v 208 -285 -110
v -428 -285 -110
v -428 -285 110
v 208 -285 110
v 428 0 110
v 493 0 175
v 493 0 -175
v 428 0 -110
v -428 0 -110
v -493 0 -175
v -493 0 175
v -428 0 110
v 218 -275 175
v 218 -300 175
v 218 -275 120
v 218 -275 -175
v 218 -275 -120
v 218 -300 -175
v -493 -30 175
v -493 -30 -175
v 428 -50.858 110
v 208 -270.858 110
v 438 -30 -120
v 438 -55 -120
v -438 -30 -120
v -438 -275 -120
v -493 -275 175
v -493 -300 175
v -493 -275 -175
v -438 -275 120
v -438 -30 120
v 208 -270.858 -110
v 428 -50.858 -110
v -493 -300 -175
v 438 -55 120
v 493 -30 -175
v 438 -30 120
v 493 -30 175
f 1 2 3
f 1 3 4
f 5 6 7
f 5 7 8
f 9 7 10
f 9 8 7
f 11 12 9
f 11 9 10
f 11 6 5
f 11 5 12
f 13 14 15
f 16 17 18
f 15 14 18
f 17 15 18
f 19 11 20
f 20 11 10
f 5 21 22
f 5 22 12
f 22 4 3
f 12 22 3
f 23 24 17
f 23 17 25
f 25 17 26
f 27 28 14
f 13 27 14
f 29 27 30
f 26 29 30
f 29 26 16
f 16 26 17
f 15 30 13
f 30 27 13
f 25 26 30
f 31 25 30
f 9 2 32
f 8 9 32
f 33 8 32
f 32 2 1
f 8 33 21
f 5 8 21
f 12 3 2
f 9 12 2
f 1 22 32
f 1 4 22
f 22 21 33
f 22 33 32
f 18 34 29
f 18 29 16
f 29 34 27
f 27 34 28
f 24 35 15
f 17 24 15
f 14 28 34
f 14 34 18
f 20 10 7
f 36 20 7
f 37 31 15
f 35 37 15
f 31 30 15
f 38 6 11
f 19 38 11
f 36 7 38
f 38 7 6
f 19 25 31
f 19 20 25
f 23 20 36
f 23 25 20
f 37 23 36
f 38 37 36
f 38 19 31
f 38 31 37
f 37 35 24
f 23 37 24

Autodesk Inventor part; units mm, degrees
ref_plane "YZ Plane" through (0, 0, 0) normal (1, 0, 0) x (0, 1, 0)
ref_plane "XZ Plane" through (0, 0, 0) normal (0, 1, 0) x (-1, 0, 0)
ref_plane "XY Plane" through (0, 0, 0) normal (0, 0, 1) x (1, 0, 0)
sketch "Эскиз1" plane through (0, 0, 0) normal (0, 1, 0) x (-1, 0, 0)
  line L0 (493, -175) -> (-493, -175)
  line L1 (-493, -175) -> (-493, 175)
  line L2 (-493, 175) -> (493, 175)
  line L3 (493, 175) -> (493, -175)
  line L4 (493, -175) -> (-493, 175) construction
  line L5 (-493, -175) -> (493, 175) construction
  point P0 (0, 0)
  dimension "d0" = 986
  dimension "d1" = 350
extrude "Выдавливание1" add sketch "Эскиз1" against normal blind 300
sketch "Эскиз2" plane through (0, -300, 0) normal (0, -1, 0) x (1, 0, 0)
  line L0 (493, 175) -> (-493, 175) projected
  line L1 (-493, 175) -> (-493, -175) projected
  line L2 (-493, -175) -> (493, -175) projected
  line L3 (493, -175) -> (493, 175) projected
  line L4 (-438, 120) -> (438, 120)
  line L5 (438, 120) -> (438, -120)
  line L6 (438, -120) -> (-438, -120)
  line L7 (-438, -120) -> (-438, 120)
  point P0 (0, 0)
  dimension "d4" = 55
extrude "Выдавливание2" cut sketch "Эскиз2" against normal blind 270
sketch "Эскиз4" plane through (-493, 0, 175) normal (0, 0, 1) x (1, 0, 0)
  line L0 (0, 0) -> (986, 0) projected
  line L1 (986, 0) -> (711, -275)
  line L2 (986, 0) -> (1374.9087, 0) construction
  line L3 (931, -300) -> (55, -300) projected
  line L4 (931, -55) -> (931, -300)
  line L5 (931, -300) -> (931, -30) projected
  line L6 (711, -275) -> (711, -300)
  line L7 (711, -300) -> (931, -300)
  point P0 (493, 0)
  dimension "d10" = 135
  dimension "d13" = 25
extrude "Выдавливание3" cut sketch "Эскиз4" against normal through all
sketch "Эскиз5" plane through (0, -300, 0) normal (0, -1, 0) x (1, 0, 0)
  line L0 (-493, -175) -> (-493, 175) construction
  line L1 (493, -175) -> (-493, -175) construction
  line L2 (493, 175) -> (493, -175) construction
  line L3 (-493, 175) -> (493, 175) construction
  line L4 (438, 120) -> (-438, 120) construction
  line L5 (438, -120) -> (438, 120) construction
  line L6 (-438, -120) -> (438, -120) construction
  line L7 (-438, 120) -> (-438, -120) construction
  line L8 (-493, 175) -> (493, 175) projected
  line L9 (218, 175) -> (-493, 175)
  line L10 (-493, -175) -> (-493, 175) projected
  line L11 (-493, 175) -> (-493, -175)
  line L12 (-493, -175) -> (218, -175)
  line L13 (493, -175) -> (-493, -175) projected
  line L14 (218, 175) -> (218, -175)
  point P0 (0, 0)
  point P1 (218, 120)
extrude "Выдавливание5" add sketch "Эскиз5" against normal blind 25
shell "Оболочка1" thickness 10 removed faces 1 at (-164.3333, 0, -58.3333)
sketch "Эскиз6" plane through (-483, -20, 165) normal (0, 1, 0) x (1, 0, 0)
  line L0 (0, 330) -> (0, 0) projected
  line L1 (0, 0) -> (966, 0) projected
  line L2 (966, 0) -> (966, 330) projected
  line L3 (966, 330) -> (0, 330) projected
  line L4 (911, 55) -> (55, 55) projected
  line L5 (55, 55) -> (55, 275) projected
  line L6 (55, 275) -> (911, 275) projected
  line L7 (911, 275) -> (911, 55) projected
  point P0 (483, 165)
extrude "Выдавливание6" add sketch "Эскиз6" along normal up to surface (20 mm away)
sketch "Эскиз7" plane through (-483, -290, -165) normal (0, 1, 0) x (1, 0, 0)
  line L0 (691, 0) -> (691, -330) projected
  line L1 (0, 0) -> (691, 0) projected
  line L2 (0, -330) -> (0, 0) projected
  line L3 (691, -330) -> (0, -330) projected
  point P0 (483, -165)
extrude "Выдавливание7" add sketch "Эскиз7" along normal up to surface (5 mm away)
sketch "Эскиз8" plane through (-493, 0, 175) normal (0, 0, 1) x (1, 0, 0)
  line L0 (0, 0) -> (986, 0) projected
  line L1 (986, 0) -> (986, -30) projected
  point P0 (493, 0)
  point P1 (856, 0)
  point P2 (656, 0)
  point P3 (356, 0)
  point P4 (986, -15)
  dimension "d21" = 130
  dimension "d22" = 200
  dimension "d23" = 300
properties part number "Корпус" material "Сталь, углеродистая"
